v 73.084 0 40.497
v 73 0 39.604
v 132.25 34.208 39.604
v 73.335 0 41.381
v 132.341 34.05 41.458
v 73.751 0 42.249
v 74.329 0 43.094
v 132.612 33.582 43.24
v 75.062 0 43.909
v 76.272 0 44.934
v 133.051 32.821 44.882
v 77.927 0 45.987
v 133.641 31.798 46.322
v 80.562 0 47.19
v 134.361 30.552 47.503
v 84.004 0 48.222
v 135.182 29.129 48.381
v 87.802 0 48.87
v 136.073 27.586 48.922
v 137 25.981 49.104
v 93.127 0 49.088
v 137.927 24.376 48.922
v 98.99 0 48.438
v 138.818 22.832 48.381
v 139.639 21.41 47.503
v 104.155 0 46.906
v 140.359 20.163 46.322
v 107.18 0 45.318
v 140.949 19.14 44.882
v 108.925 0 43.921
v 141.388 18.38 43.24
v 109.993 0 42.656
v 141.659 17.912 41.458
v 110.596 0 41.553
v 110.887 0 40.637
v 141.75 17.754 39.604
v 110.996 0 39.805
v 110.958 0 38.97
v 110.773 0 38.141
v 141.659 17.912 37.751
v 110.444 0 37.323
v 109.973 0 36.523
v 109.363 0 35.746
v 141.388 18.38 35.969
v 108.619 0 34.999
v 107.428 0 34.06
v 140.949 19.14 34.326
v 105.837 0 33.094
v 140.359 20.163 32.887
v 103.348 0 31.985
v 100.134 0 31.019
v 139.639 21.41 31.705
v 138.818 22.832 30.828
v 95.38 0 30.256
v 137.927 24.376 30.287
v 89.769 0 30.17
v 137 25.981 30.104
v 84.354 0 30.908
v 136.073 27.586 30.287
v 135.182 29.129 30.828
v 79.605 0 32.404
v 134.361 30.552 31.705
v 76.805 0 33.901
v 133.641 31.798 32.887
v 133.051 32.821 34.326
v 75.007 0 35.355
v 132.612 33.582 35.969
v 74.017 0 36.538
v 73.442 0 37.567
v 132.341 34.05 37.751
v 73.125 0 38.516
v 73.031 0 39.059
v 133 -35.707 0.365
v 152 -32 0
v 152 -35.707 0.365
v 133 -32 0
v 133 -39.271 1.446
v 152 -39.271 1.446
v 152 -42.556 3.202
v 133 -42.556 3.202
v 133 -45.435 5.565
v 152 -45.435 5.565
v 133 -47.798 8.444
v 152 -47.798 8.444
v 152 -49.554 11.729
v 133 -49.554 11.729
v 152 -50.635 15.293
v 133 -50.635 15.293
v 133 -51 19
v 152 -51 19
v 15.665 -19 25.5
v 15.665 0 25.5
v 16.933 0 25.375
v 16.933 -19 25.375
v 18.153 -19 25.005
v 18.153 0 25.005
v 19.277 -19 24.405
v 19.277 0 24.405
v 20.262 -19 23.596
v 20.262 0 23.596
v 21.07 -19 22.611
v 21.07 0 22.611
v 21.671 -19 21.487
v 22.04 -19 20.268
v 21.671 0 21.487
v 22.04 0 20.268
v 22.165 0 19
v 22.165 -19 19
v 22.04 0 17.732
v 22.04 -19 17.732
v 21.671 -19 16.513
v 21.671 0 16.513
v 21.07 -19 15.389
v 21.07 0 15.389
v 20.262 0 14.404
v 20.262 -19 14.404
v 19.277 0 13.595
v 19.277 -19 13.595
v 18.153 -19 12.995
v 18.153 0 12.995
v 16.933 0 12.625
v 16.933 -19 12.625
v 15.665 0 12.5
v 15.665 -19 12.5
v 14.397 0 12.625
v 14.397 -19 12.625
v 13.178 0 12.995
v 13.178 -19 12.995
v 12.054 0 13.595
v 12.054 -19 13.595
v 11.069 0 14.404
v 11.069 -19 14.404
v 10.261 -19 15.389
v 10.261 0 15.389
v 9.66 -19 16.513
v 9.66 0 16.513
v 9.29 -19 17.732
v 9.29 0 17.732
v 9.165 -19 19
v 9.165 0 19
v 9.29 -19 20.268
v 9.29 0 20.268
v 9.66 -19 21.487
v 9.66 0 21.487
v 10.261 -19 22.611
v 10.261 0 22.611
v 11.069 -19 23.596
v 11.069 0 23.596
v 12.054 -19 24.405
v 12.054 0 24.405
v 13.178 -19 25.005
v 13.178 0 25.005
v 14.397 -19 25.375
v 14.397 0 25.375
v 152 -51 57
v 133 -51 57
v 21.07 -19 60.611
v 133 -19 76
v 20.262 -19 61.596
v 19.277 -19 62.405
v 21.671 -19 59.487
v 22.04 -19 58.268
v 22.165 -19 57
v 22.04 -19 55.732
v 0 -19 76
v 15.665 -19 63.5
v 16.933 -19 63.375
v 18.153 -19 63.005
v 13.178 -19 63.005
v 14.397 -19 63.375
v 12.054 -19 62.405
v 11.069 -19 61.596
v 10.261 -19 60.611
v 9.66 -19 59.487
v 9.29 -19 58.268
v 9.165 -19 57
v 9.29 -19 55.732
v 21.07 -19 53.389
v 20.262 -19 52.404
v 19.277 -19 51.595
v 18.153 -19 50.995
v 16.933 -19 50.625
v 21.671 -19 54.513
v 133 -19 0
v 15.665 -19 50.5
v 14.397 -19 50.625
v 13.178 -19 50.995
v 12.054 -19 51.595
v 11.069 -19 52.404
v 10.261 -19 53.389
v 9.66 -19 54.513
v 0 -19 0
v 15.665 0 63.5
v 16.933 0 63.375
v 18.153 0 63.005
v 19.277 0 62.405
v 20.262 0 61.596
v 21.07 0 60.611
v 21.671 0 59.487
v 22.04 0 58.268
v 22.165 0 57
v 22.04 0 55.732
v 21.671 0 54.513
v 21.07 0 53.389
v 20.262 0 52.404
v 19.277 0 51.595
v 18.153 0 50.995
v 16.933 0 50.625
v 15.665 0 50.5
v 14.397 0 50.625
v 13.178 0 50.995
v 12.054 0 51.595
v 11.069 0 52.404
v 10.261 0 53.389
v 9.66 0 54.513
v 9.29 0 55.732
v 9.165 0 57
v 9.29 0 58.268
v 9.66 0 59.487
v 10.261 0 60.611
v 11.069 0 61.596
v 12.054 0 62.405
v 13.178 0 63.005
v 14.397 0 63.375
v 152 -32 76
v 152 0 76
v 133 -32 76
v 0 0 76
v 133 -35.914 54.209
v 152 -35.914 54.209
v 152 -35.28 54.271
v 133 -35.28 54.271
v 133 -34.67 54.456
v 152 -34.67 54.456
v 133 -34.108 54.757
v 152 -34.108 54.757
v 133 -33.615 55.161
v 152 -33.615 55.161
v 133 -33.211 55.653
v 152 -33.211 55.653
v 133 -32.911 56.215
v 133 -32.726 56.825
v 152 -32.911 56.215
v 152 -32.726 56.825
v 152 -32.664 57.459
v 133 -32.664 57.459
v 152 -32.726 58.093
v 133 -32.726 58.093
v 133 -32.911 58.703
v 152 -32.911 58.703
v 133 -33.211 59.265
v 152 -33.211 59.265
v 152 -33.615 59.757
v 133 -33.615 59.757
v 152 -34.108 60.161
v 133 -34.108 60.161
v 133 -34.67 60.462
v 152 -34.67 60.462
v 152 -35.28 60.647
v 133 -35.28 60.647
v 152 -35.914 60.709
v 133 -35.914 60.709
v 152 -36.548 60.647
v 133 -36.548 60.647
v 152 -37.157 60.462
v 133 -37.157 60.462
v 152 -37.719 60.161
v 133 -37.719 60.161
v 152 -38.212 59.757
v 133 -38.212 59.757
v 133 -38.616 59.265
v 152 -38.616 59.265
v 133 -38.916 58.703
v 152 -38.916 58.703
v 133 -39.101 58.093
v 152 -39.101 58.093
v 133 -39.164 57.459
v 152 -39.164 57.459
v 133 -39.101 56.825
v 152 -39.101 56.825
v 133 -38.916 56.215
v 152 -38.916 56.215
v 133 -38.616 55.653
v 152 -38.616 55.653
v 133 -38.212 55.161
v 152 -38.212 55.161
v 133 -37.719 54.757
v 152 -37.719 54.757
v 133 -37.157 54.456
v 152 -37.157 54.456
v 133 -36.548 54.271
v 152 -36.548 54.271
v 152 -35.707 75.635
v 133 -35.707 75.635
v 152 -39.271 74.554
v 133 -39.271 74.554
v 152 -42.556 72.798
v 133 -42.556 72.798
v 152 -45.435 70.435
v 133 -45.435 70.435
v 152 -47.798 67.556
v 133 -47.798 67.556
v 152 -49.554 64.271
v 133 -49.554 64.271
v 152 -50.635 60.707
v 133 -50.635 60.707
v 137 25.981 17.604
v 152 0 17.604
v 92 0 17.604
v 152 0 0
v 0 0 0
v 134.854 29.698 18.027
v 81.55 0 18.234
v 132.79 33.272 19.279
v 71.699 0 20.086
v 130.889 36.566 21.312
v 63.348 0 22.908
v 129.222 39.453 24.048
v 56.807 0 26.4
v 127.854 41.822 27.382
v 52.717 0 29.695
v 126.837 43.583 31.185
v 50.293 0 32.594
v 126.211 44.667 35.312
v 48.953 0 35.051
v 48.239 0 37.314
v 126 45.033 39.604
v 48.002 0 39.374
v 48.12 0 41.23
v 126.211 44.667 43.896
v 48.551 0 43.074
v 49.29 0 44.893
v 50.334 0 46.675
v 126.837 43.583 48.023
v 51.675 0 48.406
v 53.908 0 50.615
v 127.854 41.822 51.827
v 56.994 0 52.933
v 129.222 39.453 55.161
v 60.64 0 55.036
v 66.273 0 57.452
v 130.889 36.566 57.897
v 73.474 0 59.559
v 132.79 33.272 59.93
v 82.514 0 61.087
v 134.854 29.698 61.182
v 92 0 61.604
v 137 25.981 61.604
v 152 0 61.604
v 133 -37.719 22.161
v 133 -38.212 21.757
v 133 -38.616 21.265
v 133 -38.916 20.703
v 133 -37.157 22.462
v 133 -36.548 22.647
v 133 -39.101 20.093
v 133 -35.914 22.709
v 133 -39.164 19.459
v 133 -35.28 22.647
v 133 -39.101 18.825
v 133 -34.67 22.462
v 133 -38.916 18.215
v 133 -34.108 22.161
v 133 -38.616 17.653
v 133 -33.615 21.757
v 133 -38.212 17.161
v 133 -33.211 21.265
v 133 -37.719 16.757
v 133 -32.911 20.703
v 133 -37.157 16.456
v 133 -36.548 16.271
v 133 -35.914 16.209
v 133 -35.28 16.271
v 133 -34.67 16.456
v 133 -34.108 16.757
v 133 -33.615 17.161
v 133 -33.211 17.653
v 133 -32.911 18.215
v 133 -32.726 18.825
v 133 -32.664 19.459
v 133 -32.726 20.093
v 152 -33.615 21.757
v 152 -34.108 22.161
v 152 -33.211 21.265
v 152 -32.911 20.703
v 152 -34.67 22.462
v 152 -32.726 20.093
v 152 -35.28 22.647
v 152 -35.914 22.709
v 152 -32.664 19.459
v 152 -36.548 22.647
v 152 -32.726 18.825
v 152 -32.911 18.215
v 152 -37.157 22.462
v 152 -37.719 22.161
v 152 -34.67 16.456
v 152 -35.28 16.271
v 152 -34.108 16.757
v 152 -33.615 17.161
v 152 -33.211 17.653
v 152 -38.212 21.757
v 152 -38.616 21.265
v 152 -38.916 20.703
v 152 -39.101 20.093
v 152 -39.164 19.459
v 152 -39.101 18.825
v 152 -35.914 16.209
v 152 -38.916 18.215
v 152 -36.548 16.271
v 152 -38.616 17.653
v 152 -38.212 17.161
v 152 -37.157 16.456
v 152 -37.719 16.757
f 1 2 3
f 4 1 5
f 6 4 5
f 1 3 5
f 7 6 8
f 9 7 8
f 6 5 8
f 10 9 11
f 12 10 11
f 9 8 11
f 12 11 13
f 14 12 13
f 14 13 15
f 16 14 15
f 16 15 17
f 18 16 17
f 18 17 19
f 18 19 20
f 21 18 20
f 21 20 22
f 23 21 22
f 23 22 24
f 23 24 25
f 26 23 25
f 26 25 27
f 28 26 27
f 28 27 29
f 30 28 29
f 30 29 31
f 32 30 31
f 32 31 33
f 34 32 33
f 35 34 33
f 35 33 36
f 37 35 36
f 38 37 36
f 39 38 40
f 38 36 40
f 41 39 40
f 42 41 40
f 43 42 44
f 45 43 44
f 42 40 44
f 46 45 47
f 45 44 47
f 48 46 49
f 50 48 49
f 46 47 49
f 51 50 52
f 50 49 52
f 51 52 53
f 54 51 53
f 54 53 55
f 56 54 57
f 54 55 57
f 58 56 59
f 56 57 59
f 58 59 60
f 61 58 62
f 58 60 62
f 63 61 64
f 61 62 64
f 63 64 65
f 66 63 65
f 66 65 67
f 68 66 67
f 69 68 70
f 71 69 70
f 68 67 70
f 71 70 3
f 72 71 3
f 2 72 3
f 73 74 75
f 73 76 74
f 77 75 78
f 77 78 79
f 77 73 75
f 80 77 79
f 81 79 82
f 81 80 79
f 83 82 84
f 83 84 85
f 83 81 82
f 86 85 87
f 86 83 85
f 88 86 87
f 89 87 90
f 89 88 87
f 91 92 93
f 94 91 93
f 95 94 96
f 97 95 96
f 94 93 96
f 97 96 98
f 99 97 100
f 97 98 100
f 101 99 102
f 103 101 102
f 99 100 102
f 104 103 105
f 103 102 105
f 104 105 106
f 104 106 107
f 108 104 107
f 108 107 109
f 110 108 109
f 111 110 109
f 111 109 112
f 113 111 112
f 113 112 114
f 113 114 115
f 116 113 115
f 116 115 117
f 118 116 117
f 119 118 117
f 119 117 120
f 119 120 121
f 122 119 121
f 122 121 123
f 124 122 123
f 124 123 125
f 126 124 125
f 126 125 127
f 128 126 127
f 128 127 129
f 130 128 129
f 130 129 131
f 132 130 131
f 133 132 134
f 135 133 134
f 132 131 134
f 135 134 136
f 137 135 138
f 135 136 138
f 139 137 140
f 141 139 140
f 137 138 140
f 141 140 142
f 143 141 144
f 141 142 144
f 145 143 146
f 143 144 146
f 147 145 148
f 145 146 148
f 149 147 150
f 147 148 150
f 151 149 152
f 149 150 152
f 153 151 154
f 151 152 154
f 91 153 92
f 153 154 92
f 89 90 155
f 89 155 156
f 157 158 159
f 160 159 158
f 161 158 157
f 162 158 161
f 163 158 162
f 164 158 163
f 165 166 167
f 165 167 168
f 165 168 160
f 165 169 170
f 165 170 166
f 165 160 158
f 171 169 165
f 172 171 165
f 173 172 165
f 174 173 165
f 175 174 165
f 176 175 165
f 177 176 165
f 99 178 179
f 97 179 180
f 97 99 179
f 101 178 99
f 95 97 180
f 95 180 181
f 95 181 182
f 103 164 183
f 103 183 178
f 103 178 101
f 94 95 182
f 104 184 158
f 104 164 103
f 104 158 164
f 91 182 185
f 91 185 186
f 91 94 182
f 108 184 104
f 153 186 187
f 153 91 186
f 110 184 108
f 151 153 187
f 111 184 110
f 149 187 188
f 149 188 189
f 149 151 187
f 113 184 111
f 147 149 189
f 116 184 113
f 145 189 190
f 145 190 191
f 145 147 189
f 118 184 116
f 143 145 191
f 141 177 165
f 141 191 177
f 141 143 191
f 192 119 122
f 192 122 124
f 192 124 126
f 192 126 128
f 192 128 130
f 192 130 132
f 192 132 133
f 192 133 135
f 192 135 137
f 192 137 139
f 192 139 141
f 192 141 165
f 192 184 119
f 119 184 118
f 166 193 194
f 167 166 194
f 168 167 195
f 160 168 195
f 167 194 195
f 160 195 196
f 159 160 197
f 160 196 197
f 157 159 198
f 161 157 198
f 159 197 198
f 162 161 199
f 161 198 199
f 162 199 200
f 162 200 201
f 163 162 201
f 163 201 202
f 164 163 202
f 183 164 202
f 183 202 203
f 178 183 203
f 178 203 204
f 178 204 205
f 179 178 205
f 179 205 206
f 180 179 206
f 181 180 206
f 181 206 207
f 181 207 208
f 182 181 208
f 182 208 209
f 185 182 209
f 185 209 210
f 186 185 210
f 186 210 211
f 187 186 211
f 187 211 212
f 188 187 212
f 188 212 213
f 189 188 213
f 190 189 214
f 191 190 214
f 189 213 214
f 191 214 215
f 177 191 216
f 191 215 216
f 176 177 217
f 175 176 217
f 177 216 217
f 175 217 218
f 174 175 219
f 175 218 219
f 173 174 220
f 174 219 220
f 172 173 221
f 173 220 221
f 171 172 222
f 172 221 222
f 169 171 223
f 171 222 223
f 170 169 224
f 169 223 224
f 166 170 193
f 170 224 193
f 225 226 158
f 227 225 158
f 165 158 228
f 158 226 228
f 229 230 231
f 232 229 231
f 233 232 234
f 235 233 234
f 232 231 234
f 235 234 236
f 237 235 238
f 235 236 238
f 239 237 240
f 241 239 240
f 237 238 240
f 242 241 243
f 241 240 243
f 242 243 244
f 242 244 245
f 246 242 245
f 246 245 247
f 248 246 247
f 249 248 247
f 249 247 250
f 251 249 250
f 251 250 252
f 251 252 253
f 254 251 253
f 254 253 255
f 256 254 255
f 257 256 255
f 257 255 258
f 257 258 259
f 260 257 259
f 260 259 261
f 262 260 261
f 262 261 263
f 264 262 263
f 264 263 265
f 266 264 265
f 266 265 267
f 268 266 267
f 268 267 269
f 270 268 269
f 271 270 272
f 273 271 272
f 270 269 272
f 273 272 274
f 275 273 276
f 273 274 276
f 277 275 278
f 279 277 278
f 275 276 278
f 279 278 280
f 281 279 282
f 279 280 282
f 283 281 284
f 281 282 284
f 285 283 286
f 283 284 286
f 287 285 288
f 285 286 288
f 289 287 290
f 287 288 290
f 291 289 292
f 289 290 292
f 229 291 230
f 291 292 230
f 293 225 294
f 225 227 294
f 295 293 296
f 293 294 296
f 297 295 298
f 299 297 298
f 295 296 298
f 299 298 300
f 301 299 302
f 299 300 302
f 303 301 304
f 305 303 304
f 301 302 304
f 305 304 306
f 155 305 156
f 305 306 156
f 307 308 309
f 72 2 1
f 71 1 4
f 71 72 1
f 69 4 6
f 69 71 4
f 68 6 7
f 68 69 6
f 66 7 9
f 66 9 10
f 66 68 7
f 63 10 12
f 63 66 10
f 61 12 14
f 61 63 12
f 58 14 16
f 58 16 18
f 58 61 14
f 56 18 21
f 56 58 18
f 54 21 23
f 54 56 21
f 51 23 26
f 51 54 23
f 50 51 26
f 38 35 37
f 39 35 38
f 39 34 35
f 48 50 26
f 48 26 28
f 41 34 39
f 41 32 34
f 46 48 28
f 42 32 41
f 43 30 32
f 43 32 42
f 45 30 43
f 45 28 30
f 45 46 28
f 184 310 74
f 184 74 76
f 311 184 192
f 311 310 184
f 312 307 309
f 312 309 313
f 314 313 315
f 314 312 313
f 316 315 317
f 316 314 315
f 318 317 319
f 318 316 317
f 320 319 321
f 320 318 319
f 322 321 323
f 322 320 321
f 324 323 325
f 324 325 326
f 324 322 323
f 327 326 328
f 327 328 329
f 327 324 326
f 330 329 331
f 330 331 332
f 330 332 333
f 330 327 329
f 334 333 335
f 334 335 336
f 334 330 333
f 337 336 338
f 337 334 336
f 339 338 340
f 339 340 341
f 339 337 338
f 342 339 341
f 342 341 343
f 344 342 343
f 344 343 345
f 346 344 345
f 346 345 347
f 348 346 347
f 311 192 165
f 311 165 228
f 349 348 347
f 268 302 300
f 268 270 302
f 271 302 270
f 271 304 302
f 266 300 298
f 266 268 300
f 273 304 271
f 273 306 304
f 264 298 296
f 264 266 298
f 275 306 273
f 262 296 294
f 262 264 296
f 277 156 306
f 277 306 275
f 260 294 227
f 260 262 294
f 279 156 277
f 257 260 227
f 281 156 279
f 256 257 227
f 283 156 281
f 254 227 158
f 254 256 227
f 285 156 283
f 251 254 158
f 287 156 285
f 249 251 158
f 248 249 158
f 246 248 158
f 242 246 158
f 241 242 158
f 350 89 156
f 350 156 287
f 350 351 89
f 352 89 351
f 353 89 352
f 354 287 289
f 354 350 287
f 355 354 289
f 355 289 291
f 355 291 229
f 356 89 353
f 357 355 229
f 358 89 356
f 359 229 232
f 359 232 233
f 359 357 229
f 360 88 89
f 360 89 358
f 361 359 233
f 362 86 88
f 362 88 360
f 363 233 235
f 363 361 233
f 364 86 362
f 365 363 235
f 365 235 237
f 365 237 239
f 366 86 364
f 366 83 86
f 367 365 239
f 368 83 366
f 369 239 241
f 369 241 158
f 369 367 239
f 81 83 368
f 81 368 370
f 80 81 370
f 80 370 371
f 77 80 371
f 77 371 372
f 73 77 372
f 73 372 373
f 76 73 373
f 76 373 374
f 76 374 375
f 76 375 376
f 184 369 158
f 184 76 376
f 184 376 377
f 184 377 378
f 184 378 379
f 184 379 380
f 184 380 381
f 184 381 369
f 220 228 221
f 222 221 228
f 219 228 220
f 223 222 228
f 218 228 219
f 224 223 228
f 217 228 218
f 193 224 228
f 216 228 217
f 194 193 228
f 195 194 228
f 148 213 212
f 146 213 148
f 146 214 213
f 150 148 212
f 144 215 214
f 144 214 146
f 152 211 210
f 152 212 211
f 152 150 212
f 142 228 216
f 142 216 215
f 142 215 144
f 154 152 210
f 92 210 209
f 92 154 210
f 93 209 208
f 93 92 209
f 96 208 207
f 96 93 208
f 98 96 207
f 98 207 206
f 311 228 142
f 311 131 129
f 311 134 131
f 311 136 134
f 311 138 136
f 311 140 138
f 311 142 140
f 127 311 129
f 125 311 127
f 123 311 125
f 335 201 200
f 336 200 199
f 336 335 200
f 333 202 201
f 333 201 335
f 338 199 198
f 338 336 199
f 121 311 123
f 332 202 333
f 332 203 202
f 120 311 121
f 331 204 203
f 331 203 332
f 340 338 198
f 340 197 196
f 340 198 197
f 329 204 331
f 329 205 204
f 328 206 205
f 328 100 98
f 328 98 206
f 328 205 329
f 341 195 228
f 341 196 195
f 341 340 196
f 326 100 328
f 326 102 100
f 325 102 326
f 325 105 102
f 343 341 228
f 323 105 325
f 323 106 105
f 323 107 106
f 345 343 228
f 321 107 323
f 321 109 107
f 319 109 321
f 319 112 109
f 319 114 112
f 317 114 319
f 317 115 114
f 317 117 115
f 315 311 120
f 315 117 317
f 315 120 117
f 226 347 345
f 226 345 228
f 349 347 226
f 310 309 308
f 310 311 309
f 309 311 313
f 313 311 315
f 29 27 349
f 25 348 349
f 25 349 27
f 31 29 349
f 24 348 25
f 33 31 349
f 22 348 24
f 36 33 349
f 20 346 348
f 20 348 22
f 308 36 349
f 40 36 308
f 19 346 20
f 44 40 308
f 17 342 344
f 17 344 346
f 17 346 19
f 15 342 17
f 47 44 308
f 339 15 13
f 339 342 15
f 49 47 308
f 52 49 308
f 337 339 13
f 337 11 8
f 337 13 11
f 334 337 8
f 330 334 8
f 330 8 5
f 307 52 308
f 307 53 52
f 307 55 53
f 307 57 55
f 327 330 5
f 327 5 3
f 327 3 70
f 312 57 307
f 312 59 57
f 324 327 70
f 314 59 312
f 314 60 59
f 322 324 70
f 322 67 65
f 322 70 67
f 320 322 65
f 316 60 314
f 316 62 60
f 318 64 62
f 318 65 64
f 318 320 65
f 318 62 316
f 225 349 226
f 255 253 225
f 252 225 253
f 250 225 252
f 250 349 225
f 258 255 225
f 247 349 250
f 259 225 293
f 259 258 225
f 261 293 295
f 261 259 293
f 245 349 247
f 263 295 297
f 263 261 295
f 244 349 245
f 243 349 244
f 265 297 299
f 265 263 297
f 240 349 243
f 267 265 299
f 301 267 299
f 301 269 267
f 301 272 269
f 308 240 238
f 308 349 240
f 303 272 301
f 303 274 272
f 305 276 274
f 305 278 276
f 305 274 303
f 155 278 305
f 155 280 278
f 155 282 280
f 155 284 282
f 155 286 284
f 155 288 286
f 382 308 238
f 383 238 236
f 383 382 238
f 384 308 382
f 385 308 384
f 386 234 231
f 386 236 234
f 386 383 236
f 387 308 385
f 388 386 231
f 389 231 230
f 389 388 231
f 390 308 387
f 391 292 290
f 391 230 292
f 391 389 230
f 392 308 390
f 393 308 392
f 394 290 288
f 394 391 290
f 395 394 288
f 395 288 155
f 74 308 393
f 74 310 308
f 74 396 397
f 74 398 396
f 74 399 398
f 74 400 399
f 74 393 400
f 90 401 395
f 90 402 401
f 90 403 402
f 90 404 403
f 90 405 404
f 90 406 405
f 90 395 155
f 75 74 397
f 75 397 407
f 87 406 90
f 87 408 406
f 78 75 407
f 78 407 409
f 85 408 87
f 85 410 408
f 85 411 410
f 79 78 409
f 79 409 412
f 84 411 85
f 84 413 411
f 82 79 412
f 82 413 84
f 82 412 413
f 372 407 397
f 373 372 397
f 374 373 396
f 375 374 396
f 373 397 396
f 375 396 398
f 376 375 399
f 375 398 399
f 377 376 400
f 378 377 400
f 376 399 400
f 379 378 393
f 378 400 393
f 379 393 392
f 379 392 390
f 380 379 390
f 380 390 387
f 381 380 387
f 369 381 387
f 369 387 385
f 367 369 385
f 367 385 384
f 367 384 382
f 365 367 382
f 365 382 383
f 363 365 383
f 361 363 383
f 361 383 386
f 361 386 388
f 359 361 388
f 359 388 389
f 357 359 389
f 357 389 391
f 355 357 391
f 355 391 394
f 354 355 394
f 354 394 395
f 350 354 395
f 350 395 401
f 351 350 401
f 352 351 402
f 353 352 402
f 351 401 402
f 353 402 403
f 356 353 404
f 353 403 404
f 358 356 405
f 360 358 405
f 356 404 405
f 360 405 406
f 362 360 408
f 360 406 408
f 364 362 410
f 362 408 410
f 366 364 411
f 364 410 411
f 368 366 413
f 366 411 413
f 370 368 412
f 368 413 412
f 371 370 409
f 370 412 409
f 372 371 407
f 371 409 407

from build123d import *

# Parameters (mm, degrees)
EXTRUDE_1_DEPTH     = 76
EXTRUDE_2_REACH     = 182.051
SKETCH_2_R          = 9.5
SKETCH_3_R          = 3.25
CUT_EXTRUDE_1_DEPTH = 76
SKETCH_4_R          = 6.5
CUT_EXTRUDE_2_DEPTH = 76
FILLET_2_R          = 19


with BuildPart() as part:
    # 스케치1 → 보스-돌출1 (new body)
    with BuildSketch(Plane.XY):
        Polygon((0, 0), (152, 0), (152, -51), (133, -51), (133, -19), (0, -19), align=None)
    extrude(amount=EXTRUDE_1_DEPTH)

    # 보스-돌출2: up to this face of the body (flat: up to its plane)
    extrude_2_end = Plane(part.part.faces().sort_by_distance((76, 0, 38))[0])
    # 스케치2 → 보스-돌출2 (add, up to the picked face)
    with BuildSketch(Plane(origin=(114, 65.817930688, 0), x_dir=(0, 0, -1), z_dir=(0.8660254037844398, 0.499999999999998, 0)), mode=Mode.PRIVATE) as extrude_2_sk1:
        with BuildLine():
            Line((-61.604391893, -46), (-61.604391893, -76))
            Line((-61.604391893, -76), (-17.604391893, -76))
            Line((-17.604391893, -76), (-17.604391893, -46))
            ThreePointArc((-17.604391893, -46), (-39.604391893, -24), (-61.604391893, -46))
        make_face()
        with Locations(Location((-39.604391893, -46, 0), (0, 0, 90))):
            Circle(SKETCH_2_R, mode=Mode.SUBTRACT)
    extrude_2_tool1 = split(extrude(extrude_2_sk1.sketch, amount=-EXTRUDE_2_REACH, mode=Mode.PRIVATE), bisect_by=extrude_2_end, keep=Keep.BOTH, mode=Mode.PRIVATE)
    add(extrude_2_tool1.solids().sort_by(Axis((144.5, 12.990381, 60.923216), (-0.8660254037844398, -0.499999999999998, 0)))[0])

    # 스케치3 → 컷-돌출1 (cut)
    with BuildSketch(Plane(origin=(152, 0, 0), x_dir=(0, 0, -1), z_dir=(1, 0, 0))):
        with Locations((-57.45899172, -35.913585608)):
            Circle(SKETCH_3_R)
        with Locations((-19.45899172, -35.913585608)):
            Circle(SKETCH_3_R)
    extrude(amount=-CUT_EXTRUDE_1_DEPTH, mode=Mode.SUBTRACT)

    # 스케치4 → 컷-돌출2 (cut)
    with BuildSketch(Plane(origin=(0, 0, 0), x_dir=(1, 0, 0), z_dir=(0, 1, 0))):
        with Locations(Location((15.665320211, -57, 0), (0, 0, 270))):
            Circle(SKETCH_4_R)
        with Locations(Location((15.665320211, -19, 0), (0, 0, 270))):
            Circle(SKETCH_4_R)
    extrude(amount=-CUT_EXTRUDE_2_DEPTH, mode=Mode.SUBTRACT)

    # 필렛2
    fillet_2_edges = [part.edges().sort_by_distance(p)[0] for p in [
        (142.5, -51, 76),
        (142.5, -51, 0),
    ]]
    fillet(fillet_2_edges, radius=FILLET_2_R)


solid = part.part
